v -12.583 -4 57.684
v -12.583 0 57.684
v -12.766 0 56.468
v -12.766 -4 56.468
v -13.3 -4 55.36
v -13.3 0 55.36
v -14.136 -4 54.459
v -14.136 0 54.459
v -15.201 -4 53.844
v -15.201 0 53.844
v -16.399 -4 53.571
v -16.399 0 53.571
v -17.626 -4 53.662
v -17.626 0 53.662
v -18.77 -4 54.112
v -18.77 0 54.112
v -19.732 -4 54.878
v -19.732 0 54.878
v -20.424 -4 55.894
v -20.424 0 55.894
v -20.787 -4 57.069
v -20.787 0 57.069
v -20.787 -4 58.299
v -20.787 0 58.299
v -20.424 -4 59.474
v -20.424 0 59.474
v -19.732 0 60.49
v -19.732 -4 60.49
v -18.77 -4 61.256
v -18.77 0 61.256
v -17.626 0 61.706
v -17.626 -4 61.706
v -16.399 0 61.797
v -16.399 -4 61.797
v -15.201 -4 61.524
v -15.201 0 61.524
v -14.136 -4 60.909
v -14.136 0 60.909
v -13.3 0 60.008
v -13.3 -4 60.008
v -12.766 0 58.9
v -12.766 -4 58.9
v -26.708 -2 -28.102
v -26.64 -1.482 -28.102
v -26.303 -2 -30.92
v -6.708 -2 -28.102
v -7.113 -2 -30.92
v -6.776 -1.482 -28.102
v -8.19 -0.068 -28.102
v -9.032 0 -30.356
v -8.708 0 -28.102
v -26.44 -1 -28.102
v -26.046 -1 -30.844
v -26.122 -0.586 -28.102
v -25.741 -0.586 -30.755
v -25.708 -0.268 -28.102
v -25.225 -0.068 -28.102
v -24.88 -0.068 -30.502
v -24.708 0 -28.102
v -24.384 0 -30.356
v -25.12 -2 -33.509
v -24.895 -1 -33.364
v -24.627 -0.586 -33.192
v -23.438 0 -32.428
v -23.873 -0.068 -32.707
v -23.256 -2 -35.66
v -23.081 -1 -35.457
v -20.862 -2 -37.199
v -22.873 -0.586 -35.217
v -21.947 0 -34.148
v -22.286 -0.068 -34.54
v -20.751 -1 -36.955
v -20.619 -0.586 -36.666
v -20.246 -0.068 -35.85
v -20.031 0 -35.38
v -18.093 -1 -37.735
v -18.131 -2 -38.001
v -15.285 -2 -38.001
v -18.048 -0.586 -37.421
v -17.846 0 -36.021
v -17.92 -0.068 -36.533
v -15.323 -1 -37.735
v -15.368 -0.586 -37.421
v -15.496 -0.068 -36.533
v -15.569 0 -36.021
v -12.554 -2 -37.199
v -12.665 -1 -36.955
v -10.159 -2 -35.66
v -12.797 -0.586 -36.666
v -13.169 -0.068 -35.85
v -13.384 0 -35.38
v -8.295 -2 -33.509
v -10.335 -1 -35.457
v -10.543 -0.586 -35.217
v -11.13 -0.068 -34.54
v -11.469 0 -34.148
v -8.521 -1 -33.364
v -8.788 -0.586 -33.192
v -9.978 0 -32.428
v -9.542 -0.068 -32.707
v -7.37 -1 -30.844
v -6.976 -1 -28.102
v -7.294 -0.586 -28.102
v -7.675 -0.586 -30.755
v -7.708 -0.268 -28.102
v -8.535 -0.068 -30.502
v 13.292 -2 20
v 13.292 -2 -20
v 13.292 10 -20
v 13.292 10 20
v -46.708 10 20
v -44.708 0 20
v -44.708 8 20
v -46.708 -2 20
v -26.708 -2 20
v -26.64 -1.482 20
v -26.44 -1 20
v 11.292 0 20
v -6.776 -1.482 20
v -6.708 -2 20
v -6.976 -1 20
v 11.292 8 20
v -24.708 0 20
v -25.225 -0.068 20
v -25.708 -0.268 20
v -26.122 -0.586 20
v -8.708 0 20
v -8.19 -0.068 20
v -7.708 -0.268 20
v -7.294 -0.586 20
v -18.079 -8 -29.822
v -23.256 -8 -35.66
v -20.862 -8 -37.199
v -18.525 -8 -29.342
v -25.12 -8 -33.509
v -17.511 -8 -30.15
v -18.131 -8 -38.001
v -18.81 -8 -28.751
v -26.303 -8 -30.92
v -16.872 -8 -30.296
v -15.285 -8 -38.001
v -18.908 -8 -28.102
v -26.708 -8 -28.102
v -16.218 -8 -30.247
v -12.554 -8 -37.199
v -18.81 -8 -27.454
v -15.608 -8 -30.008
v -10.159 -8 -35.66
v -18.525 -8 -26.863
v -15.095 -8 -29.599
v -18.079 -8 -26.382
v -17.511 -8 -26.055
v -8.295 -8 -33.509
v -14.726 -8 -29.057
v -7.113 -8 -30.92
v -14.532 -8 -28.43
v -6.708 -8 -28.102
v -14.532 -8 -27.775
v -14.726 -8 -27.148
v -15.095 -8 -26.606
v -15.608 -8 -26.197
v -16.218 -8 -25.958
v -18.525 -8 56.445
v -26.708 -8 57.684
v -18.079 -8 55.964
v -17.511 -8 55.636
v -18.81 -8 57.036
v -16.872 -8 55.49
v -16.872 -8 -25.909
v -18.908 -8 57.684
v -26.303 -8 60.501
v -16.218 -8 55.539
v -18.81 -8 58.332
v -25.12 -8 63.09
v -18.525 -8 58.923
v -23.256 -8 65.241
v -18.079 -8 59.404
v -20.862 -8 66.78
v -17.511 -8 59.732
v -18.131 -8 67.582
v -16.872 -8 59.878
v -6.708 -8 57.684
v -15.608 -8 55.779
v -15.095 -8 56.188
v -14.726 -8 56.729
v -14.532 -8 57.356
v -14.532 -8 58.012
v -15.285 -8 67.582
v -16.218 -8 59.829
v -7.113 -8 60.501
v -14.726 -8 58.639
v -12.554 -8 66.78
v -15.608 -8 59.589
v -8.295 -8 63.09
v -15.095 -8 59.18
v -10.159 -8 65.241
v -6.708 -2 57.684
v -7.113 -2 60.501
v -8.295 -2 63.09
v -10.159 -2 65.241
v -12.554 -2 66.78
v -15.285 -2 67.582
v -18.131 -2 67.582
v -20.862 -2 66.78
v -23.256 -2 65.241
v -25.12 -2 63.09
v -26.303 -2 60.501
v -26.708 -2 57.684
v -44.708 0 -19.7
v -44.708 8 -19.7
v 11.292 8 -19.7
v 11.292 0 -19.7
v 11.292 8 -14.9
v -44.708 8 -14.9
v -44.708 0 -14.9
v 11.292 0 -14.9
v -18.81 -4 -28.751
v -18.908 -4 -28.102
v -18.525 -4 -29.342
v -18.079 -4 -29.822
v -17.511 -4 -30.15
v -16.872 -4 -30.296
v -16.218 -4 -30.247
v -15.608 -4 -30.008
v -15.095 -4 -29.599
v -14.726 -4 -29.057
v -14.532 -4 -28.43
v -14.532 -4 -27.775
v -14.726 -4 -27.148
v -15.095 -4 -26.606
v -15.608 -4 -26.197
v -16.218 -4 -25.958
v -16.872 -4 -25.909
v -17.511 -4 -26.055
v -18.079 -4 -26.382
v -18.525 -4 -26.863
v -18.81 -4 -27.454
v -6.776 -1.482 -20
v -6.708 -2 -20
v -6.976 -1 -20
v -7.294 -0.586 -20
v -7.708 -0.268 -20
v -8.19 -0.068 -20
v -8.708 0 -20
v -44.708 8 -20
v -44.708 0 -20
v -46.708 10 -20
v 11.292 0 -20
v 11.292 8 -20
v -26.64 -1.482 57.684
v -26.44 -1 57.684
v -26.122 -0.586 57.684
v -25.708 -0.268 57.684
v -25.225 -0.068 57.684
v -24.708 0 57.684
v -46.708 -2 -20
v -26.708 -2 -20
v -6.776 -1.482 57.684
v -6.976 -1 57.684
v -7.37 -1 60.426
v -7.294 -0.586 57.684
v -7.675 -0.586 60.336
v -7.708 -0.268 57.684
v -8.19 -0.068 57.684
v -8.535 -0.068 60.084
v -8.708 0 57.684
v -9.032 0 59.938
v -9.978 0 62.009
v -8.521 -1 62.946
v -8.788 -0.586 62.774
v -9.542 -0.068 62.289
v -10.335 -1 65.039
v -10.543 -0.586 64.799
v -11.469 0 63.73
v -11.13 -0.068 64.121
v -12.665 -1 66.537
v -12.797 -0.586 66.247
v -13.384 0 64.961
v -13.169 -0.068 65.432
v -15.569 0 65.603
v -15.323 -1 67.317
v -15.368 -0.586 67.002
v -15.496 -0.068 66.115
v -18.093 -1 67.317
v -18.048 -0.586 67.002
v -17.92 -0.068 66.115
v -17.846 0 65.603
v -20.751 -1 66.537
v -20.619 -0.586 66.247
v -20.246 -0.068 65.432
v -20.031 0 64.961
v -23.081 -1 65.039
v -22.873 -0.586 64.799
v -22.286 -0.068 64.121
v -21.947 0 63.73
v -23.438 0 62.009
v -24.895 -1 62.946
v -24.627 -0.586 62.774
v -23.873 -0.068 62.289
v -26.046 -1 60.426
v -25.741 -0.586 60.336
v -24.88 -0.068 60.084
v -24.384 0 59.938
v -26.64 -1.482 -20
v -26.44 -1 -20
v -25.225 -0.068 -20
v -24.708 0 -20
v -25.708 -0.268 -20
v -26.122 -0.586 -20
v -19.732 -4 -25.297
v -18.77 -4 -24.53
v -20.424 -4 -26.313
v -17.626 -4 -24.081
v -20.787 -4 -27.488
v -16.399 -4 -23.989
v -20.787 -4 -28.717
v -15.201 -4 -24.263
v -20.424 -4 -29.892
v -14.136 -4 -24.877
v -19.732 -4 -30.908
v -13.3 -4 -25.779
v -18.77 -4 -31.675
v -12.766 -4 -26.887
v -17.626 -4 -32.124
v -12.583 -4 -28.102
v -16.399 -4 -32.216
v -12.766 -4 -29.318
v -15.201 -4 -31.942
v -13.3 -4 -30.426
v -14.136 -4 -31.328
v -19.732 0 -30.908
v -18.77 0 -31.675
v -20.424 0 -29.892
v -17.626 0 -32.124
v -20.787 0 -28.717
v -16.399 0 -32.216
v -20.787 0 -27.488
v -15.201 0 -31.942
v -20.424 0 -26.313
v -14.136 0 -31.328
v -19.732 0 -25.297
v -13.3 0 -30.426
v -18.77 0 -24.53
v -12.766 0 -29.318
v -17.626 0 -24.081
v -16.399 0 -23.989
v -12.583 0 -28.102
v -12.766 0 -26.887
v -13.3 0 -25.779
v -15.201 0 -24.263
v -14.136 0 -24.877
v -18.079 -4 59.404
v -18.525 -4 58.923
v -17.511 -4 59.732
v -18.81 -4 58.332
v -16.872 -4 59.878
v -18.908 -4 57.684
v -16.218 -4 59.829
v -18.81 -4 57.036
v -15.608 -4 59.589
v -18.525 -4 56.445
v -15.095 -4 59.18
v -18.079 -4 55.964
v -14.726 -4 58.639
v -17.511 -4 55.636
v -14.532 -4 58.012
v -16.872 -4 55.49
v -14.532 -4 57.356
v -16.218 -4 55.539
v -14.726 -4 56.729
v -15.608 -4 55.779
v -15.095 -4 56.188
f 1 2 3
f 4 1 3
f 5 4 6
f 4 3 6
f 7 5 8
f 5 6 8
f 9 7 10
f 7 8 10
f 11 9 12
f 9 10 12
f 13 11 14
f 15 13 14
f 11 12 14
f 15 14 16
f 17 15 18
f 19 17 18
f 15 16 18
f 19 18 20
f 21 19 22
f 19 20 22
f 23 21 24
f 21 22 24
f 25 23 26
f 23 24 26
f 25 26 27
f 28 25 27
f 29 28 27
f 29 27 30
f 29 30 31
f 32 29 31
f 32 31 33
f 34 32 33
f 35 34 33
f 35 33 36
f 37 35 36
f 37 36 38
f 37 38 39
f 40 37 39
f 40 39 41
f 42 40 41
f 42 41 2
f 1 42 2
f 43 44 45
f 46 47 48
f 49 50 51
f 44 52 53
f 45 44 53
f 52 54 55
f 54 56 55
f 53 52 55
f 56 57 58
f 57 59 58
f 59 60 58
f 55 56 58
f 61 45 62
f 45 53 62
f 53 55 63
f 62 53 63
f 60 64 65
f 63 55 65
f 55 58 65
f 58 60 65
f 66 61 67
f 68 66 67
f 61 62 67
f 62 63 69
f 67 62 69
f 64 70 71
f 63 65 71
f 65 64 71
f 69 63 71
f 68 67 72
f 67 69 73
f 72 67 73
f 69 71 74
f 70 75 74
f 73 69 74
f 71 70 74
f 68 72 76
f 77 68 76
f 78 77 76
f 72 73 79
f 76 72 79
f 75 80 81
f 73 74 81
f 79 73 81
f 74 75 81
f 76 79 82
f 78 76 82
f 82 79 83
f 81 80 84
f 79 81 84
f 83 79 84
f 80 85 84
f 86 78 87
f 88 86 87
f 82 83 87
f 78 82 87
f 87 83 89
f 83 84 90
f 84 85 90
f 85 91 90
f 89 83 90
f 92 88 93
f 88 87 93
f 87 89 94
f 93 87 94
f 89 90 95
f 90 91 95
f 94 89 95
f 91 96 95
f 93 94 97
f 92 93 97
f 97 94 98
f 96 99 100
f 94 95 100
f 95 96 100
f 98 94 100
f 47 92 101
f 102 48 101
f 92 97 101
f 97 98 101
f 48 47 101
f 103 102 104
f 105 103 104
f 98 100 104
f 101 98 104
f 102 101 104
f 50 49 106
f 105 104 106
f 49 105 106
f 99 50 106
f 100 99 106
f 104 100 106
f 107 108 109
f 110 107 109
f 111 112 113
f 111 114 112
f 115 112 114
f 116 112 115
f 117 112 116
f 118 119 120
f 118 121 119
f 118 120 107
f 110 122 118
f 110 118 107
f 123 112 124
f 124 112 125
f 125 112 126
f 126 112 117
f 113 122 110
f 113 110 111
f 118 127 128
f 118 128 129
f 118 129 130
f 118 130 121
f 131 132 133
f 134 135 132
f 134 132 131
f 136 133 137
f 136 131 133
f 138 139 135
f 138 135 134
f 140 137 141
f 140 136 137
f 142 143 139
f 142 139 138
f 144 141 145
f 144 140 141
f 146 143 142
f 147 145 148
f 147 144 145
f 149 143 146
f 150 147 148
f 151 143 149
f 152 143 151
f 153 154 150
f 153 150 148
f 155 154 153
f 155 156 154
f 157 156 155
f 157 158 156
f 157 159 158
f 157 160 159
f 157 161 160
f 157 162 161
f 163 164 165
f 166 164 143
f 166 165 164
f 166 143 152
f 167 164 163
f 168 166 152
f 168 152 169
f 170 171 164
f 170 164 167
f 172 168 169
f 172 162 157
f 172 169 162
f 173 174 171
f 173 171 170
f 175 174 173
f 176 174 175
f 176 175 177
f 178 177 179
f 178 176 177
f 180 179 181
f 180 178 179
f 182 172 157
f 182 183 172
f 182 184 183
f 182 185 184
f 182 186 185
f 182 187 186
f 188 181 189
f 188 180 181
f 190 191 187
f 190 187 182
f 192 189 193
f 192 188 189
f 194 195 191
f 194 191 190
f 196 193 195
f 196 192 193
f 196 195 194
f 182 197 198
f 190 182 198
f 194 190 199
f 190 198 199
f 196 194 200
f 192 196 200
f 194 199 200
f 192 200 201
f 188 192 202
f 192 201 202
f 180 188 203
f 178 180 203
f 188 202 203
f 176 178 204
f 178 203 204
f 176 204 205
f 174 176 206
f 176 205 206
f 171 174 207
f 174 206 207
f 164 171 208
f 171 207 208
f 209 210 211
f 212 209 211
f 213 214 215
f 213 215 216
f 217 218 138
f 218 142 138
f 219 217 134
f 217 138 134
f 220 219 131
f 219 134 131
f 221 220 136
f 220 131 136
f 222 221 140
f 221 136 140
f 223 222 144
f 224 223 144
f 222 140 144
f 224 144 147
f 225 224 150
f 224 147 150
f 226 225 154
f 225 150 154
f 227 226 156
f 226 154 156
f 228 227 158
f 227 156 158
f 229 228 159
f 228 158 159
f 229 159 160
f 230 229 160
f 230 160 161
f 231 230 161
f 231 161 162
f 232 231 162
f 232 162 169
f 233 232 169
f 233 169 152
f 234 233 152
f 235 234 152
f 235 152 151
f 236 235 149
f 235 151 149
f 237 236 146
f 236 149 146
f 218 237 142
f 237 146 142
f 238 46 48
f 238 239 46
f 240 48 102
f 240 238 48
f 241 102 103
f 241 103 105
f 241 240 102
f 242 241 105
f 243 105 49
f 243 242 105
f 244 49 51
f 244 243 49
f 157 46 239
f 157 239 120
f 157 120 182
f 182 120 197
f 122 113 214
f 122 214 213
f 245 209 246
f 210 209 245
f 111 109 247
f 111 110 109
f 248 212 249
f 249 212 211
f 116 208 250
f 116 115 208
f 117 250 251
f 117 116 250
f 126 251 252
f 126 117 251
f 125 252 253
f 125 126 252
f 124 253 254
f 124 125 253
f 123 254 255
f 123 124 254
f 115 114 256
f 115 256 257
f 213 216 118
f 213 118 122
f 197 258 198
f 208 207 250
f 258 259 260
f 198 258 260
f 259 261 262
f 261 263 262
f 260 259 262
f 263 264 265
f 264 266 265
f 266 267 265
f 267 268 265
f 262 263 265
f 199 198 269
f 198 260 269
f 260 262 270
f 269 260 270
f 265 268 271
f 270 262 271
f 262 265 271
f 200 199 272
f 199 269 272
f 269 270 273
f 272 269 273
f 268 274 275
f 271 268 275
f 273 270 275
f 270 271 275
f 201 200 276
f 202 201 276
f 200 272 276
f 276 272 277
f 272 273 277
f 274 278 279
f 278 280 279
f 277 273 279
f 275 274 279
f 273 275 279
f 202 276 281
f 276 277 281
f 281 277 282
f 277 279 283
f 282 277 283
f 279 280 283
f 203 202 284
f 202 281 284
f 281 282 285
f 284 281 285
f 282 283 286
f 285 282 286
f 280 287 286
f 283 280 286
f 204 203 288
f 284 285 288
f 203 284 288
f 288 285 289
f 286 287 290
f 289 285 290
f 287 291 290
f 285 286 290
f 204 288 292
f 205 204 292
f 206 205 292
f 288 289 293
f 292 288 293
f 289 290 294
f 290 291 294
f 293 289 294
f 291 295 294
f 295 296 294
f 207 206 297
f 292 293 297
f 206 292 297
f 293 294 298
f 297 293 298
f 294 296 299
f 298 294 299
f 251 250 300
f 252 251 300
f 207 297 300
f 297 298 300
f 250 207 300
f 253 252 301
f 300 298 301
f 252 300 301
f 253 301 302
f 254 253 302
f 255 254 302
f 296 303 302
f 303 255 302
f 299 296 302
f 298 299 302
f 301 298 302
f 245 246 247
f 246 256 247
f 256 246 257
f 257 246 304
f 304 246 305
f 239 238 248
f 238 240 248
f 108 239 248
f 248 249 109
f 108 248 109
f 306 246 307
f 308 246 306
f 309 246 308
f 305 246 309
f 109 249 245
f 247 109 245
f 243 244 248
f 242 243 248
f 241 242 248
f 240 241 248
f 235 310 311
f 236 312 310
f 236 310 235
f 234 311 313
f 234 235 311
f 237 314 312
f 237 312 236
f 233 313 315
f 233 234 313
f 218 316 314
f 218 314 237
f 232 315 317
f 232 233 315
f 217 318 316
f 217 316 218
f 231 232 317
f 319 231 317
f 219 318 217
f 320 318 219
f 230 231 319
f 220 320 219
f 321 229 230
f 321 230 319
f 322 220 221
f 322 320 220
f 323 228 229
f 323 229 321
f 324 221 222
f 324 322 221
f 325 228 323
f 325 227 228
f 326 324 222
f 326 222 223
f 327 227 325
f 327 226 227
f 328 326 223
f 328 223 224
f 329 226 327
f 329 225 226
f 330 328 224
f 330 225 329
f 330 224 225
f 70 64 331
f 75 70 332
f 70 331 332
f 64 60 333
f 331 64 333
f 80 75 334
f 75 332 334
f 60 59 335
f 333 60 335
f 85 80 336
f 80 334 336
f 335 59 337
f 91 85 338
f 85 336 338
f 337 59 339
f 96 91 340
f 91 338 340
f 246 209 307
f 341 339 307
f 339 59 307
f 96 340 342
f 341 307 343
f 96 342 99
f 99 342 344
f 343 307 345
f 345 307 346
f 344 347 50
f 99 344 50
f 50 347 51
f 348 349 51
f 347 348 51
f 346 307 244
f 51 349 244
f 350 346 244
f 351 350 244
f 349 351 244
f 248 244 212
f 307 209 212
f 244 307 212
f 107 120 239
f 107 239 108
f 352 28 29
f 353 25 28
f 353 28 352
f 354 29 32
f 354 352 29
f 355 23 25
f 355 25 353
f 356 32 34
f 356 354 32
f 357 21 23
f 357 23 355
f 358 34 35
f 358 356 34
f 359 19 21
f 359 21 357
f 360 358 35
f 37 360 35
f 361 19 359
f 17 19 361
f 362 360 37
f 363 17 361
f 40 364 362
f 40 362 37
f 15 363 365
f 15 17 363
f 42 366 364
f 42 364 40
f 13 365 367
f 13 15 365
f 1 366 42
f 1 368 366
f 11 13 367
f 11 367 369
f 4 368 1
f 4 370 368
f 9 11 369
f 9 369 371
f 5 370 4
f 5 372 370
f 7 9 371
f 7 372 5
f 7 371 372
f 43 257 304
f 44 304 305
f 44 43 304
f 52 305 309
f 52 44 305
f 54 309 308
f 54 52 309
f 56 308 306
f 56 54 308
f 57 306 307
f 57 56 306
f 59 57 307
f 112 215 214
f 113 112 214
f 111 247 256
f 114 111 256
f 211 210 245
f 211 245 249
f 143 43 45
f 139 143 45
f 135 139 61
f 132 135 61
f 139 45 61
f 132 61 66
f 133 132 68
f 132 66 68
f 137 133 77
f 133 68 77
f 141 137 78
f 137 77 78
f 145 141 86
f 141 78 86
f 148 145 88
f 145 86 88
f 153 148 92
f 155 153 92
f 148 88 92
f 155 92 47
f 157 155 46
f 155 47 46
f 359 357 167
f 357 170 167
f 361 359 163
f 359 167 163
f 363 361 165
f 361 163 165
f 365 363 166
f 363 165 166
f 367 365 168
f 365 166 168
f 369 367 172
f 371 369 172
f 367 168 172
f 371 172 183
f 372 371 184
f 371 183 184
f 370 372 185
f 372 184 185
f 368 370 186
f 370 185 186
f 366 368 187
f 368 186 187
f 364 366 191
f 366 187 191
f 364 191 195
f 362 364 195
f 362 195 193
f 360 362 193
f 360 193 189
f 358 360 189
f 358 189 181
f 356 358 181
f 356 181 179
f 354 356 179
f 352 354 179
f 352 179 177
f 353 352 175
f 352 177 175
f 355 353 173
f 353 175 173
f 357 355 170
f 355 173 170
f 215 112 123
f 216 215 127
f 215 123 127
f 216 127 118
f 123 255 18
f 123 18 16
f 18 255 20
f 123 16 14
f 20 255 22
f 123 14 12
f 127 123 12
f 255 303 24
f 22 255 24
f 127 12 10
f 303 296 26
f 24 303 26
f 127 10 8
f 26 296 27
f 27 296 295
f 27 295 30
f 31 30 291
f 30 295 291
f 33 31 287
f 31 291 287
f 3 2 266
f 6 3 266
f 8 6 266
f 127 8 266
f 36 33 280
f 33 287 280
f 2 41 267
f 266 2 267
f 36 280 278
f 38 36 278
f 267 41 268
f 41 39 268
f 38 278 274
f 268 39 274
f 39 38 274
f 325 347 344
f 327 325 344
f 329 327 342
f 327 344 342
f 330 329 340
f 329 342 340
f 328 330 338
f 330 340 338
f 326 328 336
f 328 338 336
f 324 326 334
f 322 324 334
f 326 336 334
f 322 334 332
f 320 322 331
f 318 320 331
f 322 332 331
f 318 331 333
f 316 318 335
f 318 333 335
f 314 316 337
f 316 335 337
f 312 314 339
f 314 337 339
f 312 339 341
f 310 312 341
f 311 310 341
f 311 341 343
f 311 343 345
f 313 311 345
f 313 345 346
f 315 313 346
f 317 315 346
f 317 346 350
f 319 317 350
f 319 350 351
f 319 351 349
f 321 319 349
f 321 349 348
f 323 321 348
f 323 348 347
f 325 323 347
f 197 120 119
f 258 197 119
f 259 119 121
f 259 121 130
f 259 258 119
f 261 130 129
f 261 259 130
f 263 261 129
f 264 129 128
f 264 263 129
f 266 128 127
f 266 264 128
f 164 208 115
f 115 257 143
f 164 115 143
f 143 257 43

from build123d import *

# Parameters (mm, degrees)
F0_W           = 56
F0_H           = 8
F1_DEPTH       = 20
F2_START       = -14.9
F2_DEPTH       = 4.8
F4_DEPTH       = 8
F5_R           = 2
F7_D           = 4.4
F7_CBORE_D     = 8.25
F7_CBORE_DEPTH = 4


# Not quite as in the source:
# - a feature of the source that left no trace in its solid (it failed there, or was rolled back) is left out


with BuildPart() as f1:
    # F0 (on Top) → F1 (new body, symmetric)
    with BuildSketch(Plane.XY):
        Polygon((-26.7077493668, 10), (-46.7077493668, 10), (-46.7077493668, -2), (13.2922506332, -2), (13.2922506332, 10), (-6.7077493668, 10), align=None)
        with Locations((-16.7077493668, 4)):
            Rectangle(F0_W, F0_H, mode=Mode.SUBTRACT)
    extrude(amount=F1_DEPTH, both=True)

    # F0 (on Top) → F2 (join)
    with BuildSketch(Plane.XY.offset(F2_START)):
        with Locations((-16.7077493668, 4)):
            Rectangle(F0_W, F0_H)
    extrude(amount=-F2_DEPTH)

    # F3 (on Front) → F4 (join)
    with BuildSketch(Plane.XZ):
        with BuildLine():
            Line((-26.7077493668, 57.6839694445), (-26.7077493668, -28.1024485154))
            ThreePointArc((-26.7077493668, -28.1024485154), (-16.7077493668, -38.1024485154), (-6.7077493668, -28.1024485154))
            Line((-6.7077493668, -28.1024485154), (-6.7077493668, 57.6839694445))
            ThreePointArc((-6.7077493668, 57.6839694445), (-16.7077493668, 67.6839694445), (-26.7077493668, 57.6839694445))
        make_face()
    extrude(amount=F4_DEPTH)

    # F5
    f5_edges = [f1.edges().sort_by_distance(p)[0] for p in [
        (-16.707749, 0, 67.683969),
        (-6.707749, 0, 38.841985),
        (-6.707749, 0, -24.051224),
        (-26.707749, 0, 38.841985),
        (-26.707749, 0, -24.051224),
    ]]
    fillet(f5_edges, radius=F5_R)

    # F7 (through all)
    with Locations(Plane(origin=(0, 0, 0), x_dir=(1, 0, 0), z_dir=(0, 1, 0))):
        with Locations((-16.7077493668, -57.6839694445), (-16.7077493668, 28.1024485154)):
            CounterBoreHole(F7_D / 2, F7_CBORE_D / 2, F7_CBORE_DEPTH)


solid = f1.part
